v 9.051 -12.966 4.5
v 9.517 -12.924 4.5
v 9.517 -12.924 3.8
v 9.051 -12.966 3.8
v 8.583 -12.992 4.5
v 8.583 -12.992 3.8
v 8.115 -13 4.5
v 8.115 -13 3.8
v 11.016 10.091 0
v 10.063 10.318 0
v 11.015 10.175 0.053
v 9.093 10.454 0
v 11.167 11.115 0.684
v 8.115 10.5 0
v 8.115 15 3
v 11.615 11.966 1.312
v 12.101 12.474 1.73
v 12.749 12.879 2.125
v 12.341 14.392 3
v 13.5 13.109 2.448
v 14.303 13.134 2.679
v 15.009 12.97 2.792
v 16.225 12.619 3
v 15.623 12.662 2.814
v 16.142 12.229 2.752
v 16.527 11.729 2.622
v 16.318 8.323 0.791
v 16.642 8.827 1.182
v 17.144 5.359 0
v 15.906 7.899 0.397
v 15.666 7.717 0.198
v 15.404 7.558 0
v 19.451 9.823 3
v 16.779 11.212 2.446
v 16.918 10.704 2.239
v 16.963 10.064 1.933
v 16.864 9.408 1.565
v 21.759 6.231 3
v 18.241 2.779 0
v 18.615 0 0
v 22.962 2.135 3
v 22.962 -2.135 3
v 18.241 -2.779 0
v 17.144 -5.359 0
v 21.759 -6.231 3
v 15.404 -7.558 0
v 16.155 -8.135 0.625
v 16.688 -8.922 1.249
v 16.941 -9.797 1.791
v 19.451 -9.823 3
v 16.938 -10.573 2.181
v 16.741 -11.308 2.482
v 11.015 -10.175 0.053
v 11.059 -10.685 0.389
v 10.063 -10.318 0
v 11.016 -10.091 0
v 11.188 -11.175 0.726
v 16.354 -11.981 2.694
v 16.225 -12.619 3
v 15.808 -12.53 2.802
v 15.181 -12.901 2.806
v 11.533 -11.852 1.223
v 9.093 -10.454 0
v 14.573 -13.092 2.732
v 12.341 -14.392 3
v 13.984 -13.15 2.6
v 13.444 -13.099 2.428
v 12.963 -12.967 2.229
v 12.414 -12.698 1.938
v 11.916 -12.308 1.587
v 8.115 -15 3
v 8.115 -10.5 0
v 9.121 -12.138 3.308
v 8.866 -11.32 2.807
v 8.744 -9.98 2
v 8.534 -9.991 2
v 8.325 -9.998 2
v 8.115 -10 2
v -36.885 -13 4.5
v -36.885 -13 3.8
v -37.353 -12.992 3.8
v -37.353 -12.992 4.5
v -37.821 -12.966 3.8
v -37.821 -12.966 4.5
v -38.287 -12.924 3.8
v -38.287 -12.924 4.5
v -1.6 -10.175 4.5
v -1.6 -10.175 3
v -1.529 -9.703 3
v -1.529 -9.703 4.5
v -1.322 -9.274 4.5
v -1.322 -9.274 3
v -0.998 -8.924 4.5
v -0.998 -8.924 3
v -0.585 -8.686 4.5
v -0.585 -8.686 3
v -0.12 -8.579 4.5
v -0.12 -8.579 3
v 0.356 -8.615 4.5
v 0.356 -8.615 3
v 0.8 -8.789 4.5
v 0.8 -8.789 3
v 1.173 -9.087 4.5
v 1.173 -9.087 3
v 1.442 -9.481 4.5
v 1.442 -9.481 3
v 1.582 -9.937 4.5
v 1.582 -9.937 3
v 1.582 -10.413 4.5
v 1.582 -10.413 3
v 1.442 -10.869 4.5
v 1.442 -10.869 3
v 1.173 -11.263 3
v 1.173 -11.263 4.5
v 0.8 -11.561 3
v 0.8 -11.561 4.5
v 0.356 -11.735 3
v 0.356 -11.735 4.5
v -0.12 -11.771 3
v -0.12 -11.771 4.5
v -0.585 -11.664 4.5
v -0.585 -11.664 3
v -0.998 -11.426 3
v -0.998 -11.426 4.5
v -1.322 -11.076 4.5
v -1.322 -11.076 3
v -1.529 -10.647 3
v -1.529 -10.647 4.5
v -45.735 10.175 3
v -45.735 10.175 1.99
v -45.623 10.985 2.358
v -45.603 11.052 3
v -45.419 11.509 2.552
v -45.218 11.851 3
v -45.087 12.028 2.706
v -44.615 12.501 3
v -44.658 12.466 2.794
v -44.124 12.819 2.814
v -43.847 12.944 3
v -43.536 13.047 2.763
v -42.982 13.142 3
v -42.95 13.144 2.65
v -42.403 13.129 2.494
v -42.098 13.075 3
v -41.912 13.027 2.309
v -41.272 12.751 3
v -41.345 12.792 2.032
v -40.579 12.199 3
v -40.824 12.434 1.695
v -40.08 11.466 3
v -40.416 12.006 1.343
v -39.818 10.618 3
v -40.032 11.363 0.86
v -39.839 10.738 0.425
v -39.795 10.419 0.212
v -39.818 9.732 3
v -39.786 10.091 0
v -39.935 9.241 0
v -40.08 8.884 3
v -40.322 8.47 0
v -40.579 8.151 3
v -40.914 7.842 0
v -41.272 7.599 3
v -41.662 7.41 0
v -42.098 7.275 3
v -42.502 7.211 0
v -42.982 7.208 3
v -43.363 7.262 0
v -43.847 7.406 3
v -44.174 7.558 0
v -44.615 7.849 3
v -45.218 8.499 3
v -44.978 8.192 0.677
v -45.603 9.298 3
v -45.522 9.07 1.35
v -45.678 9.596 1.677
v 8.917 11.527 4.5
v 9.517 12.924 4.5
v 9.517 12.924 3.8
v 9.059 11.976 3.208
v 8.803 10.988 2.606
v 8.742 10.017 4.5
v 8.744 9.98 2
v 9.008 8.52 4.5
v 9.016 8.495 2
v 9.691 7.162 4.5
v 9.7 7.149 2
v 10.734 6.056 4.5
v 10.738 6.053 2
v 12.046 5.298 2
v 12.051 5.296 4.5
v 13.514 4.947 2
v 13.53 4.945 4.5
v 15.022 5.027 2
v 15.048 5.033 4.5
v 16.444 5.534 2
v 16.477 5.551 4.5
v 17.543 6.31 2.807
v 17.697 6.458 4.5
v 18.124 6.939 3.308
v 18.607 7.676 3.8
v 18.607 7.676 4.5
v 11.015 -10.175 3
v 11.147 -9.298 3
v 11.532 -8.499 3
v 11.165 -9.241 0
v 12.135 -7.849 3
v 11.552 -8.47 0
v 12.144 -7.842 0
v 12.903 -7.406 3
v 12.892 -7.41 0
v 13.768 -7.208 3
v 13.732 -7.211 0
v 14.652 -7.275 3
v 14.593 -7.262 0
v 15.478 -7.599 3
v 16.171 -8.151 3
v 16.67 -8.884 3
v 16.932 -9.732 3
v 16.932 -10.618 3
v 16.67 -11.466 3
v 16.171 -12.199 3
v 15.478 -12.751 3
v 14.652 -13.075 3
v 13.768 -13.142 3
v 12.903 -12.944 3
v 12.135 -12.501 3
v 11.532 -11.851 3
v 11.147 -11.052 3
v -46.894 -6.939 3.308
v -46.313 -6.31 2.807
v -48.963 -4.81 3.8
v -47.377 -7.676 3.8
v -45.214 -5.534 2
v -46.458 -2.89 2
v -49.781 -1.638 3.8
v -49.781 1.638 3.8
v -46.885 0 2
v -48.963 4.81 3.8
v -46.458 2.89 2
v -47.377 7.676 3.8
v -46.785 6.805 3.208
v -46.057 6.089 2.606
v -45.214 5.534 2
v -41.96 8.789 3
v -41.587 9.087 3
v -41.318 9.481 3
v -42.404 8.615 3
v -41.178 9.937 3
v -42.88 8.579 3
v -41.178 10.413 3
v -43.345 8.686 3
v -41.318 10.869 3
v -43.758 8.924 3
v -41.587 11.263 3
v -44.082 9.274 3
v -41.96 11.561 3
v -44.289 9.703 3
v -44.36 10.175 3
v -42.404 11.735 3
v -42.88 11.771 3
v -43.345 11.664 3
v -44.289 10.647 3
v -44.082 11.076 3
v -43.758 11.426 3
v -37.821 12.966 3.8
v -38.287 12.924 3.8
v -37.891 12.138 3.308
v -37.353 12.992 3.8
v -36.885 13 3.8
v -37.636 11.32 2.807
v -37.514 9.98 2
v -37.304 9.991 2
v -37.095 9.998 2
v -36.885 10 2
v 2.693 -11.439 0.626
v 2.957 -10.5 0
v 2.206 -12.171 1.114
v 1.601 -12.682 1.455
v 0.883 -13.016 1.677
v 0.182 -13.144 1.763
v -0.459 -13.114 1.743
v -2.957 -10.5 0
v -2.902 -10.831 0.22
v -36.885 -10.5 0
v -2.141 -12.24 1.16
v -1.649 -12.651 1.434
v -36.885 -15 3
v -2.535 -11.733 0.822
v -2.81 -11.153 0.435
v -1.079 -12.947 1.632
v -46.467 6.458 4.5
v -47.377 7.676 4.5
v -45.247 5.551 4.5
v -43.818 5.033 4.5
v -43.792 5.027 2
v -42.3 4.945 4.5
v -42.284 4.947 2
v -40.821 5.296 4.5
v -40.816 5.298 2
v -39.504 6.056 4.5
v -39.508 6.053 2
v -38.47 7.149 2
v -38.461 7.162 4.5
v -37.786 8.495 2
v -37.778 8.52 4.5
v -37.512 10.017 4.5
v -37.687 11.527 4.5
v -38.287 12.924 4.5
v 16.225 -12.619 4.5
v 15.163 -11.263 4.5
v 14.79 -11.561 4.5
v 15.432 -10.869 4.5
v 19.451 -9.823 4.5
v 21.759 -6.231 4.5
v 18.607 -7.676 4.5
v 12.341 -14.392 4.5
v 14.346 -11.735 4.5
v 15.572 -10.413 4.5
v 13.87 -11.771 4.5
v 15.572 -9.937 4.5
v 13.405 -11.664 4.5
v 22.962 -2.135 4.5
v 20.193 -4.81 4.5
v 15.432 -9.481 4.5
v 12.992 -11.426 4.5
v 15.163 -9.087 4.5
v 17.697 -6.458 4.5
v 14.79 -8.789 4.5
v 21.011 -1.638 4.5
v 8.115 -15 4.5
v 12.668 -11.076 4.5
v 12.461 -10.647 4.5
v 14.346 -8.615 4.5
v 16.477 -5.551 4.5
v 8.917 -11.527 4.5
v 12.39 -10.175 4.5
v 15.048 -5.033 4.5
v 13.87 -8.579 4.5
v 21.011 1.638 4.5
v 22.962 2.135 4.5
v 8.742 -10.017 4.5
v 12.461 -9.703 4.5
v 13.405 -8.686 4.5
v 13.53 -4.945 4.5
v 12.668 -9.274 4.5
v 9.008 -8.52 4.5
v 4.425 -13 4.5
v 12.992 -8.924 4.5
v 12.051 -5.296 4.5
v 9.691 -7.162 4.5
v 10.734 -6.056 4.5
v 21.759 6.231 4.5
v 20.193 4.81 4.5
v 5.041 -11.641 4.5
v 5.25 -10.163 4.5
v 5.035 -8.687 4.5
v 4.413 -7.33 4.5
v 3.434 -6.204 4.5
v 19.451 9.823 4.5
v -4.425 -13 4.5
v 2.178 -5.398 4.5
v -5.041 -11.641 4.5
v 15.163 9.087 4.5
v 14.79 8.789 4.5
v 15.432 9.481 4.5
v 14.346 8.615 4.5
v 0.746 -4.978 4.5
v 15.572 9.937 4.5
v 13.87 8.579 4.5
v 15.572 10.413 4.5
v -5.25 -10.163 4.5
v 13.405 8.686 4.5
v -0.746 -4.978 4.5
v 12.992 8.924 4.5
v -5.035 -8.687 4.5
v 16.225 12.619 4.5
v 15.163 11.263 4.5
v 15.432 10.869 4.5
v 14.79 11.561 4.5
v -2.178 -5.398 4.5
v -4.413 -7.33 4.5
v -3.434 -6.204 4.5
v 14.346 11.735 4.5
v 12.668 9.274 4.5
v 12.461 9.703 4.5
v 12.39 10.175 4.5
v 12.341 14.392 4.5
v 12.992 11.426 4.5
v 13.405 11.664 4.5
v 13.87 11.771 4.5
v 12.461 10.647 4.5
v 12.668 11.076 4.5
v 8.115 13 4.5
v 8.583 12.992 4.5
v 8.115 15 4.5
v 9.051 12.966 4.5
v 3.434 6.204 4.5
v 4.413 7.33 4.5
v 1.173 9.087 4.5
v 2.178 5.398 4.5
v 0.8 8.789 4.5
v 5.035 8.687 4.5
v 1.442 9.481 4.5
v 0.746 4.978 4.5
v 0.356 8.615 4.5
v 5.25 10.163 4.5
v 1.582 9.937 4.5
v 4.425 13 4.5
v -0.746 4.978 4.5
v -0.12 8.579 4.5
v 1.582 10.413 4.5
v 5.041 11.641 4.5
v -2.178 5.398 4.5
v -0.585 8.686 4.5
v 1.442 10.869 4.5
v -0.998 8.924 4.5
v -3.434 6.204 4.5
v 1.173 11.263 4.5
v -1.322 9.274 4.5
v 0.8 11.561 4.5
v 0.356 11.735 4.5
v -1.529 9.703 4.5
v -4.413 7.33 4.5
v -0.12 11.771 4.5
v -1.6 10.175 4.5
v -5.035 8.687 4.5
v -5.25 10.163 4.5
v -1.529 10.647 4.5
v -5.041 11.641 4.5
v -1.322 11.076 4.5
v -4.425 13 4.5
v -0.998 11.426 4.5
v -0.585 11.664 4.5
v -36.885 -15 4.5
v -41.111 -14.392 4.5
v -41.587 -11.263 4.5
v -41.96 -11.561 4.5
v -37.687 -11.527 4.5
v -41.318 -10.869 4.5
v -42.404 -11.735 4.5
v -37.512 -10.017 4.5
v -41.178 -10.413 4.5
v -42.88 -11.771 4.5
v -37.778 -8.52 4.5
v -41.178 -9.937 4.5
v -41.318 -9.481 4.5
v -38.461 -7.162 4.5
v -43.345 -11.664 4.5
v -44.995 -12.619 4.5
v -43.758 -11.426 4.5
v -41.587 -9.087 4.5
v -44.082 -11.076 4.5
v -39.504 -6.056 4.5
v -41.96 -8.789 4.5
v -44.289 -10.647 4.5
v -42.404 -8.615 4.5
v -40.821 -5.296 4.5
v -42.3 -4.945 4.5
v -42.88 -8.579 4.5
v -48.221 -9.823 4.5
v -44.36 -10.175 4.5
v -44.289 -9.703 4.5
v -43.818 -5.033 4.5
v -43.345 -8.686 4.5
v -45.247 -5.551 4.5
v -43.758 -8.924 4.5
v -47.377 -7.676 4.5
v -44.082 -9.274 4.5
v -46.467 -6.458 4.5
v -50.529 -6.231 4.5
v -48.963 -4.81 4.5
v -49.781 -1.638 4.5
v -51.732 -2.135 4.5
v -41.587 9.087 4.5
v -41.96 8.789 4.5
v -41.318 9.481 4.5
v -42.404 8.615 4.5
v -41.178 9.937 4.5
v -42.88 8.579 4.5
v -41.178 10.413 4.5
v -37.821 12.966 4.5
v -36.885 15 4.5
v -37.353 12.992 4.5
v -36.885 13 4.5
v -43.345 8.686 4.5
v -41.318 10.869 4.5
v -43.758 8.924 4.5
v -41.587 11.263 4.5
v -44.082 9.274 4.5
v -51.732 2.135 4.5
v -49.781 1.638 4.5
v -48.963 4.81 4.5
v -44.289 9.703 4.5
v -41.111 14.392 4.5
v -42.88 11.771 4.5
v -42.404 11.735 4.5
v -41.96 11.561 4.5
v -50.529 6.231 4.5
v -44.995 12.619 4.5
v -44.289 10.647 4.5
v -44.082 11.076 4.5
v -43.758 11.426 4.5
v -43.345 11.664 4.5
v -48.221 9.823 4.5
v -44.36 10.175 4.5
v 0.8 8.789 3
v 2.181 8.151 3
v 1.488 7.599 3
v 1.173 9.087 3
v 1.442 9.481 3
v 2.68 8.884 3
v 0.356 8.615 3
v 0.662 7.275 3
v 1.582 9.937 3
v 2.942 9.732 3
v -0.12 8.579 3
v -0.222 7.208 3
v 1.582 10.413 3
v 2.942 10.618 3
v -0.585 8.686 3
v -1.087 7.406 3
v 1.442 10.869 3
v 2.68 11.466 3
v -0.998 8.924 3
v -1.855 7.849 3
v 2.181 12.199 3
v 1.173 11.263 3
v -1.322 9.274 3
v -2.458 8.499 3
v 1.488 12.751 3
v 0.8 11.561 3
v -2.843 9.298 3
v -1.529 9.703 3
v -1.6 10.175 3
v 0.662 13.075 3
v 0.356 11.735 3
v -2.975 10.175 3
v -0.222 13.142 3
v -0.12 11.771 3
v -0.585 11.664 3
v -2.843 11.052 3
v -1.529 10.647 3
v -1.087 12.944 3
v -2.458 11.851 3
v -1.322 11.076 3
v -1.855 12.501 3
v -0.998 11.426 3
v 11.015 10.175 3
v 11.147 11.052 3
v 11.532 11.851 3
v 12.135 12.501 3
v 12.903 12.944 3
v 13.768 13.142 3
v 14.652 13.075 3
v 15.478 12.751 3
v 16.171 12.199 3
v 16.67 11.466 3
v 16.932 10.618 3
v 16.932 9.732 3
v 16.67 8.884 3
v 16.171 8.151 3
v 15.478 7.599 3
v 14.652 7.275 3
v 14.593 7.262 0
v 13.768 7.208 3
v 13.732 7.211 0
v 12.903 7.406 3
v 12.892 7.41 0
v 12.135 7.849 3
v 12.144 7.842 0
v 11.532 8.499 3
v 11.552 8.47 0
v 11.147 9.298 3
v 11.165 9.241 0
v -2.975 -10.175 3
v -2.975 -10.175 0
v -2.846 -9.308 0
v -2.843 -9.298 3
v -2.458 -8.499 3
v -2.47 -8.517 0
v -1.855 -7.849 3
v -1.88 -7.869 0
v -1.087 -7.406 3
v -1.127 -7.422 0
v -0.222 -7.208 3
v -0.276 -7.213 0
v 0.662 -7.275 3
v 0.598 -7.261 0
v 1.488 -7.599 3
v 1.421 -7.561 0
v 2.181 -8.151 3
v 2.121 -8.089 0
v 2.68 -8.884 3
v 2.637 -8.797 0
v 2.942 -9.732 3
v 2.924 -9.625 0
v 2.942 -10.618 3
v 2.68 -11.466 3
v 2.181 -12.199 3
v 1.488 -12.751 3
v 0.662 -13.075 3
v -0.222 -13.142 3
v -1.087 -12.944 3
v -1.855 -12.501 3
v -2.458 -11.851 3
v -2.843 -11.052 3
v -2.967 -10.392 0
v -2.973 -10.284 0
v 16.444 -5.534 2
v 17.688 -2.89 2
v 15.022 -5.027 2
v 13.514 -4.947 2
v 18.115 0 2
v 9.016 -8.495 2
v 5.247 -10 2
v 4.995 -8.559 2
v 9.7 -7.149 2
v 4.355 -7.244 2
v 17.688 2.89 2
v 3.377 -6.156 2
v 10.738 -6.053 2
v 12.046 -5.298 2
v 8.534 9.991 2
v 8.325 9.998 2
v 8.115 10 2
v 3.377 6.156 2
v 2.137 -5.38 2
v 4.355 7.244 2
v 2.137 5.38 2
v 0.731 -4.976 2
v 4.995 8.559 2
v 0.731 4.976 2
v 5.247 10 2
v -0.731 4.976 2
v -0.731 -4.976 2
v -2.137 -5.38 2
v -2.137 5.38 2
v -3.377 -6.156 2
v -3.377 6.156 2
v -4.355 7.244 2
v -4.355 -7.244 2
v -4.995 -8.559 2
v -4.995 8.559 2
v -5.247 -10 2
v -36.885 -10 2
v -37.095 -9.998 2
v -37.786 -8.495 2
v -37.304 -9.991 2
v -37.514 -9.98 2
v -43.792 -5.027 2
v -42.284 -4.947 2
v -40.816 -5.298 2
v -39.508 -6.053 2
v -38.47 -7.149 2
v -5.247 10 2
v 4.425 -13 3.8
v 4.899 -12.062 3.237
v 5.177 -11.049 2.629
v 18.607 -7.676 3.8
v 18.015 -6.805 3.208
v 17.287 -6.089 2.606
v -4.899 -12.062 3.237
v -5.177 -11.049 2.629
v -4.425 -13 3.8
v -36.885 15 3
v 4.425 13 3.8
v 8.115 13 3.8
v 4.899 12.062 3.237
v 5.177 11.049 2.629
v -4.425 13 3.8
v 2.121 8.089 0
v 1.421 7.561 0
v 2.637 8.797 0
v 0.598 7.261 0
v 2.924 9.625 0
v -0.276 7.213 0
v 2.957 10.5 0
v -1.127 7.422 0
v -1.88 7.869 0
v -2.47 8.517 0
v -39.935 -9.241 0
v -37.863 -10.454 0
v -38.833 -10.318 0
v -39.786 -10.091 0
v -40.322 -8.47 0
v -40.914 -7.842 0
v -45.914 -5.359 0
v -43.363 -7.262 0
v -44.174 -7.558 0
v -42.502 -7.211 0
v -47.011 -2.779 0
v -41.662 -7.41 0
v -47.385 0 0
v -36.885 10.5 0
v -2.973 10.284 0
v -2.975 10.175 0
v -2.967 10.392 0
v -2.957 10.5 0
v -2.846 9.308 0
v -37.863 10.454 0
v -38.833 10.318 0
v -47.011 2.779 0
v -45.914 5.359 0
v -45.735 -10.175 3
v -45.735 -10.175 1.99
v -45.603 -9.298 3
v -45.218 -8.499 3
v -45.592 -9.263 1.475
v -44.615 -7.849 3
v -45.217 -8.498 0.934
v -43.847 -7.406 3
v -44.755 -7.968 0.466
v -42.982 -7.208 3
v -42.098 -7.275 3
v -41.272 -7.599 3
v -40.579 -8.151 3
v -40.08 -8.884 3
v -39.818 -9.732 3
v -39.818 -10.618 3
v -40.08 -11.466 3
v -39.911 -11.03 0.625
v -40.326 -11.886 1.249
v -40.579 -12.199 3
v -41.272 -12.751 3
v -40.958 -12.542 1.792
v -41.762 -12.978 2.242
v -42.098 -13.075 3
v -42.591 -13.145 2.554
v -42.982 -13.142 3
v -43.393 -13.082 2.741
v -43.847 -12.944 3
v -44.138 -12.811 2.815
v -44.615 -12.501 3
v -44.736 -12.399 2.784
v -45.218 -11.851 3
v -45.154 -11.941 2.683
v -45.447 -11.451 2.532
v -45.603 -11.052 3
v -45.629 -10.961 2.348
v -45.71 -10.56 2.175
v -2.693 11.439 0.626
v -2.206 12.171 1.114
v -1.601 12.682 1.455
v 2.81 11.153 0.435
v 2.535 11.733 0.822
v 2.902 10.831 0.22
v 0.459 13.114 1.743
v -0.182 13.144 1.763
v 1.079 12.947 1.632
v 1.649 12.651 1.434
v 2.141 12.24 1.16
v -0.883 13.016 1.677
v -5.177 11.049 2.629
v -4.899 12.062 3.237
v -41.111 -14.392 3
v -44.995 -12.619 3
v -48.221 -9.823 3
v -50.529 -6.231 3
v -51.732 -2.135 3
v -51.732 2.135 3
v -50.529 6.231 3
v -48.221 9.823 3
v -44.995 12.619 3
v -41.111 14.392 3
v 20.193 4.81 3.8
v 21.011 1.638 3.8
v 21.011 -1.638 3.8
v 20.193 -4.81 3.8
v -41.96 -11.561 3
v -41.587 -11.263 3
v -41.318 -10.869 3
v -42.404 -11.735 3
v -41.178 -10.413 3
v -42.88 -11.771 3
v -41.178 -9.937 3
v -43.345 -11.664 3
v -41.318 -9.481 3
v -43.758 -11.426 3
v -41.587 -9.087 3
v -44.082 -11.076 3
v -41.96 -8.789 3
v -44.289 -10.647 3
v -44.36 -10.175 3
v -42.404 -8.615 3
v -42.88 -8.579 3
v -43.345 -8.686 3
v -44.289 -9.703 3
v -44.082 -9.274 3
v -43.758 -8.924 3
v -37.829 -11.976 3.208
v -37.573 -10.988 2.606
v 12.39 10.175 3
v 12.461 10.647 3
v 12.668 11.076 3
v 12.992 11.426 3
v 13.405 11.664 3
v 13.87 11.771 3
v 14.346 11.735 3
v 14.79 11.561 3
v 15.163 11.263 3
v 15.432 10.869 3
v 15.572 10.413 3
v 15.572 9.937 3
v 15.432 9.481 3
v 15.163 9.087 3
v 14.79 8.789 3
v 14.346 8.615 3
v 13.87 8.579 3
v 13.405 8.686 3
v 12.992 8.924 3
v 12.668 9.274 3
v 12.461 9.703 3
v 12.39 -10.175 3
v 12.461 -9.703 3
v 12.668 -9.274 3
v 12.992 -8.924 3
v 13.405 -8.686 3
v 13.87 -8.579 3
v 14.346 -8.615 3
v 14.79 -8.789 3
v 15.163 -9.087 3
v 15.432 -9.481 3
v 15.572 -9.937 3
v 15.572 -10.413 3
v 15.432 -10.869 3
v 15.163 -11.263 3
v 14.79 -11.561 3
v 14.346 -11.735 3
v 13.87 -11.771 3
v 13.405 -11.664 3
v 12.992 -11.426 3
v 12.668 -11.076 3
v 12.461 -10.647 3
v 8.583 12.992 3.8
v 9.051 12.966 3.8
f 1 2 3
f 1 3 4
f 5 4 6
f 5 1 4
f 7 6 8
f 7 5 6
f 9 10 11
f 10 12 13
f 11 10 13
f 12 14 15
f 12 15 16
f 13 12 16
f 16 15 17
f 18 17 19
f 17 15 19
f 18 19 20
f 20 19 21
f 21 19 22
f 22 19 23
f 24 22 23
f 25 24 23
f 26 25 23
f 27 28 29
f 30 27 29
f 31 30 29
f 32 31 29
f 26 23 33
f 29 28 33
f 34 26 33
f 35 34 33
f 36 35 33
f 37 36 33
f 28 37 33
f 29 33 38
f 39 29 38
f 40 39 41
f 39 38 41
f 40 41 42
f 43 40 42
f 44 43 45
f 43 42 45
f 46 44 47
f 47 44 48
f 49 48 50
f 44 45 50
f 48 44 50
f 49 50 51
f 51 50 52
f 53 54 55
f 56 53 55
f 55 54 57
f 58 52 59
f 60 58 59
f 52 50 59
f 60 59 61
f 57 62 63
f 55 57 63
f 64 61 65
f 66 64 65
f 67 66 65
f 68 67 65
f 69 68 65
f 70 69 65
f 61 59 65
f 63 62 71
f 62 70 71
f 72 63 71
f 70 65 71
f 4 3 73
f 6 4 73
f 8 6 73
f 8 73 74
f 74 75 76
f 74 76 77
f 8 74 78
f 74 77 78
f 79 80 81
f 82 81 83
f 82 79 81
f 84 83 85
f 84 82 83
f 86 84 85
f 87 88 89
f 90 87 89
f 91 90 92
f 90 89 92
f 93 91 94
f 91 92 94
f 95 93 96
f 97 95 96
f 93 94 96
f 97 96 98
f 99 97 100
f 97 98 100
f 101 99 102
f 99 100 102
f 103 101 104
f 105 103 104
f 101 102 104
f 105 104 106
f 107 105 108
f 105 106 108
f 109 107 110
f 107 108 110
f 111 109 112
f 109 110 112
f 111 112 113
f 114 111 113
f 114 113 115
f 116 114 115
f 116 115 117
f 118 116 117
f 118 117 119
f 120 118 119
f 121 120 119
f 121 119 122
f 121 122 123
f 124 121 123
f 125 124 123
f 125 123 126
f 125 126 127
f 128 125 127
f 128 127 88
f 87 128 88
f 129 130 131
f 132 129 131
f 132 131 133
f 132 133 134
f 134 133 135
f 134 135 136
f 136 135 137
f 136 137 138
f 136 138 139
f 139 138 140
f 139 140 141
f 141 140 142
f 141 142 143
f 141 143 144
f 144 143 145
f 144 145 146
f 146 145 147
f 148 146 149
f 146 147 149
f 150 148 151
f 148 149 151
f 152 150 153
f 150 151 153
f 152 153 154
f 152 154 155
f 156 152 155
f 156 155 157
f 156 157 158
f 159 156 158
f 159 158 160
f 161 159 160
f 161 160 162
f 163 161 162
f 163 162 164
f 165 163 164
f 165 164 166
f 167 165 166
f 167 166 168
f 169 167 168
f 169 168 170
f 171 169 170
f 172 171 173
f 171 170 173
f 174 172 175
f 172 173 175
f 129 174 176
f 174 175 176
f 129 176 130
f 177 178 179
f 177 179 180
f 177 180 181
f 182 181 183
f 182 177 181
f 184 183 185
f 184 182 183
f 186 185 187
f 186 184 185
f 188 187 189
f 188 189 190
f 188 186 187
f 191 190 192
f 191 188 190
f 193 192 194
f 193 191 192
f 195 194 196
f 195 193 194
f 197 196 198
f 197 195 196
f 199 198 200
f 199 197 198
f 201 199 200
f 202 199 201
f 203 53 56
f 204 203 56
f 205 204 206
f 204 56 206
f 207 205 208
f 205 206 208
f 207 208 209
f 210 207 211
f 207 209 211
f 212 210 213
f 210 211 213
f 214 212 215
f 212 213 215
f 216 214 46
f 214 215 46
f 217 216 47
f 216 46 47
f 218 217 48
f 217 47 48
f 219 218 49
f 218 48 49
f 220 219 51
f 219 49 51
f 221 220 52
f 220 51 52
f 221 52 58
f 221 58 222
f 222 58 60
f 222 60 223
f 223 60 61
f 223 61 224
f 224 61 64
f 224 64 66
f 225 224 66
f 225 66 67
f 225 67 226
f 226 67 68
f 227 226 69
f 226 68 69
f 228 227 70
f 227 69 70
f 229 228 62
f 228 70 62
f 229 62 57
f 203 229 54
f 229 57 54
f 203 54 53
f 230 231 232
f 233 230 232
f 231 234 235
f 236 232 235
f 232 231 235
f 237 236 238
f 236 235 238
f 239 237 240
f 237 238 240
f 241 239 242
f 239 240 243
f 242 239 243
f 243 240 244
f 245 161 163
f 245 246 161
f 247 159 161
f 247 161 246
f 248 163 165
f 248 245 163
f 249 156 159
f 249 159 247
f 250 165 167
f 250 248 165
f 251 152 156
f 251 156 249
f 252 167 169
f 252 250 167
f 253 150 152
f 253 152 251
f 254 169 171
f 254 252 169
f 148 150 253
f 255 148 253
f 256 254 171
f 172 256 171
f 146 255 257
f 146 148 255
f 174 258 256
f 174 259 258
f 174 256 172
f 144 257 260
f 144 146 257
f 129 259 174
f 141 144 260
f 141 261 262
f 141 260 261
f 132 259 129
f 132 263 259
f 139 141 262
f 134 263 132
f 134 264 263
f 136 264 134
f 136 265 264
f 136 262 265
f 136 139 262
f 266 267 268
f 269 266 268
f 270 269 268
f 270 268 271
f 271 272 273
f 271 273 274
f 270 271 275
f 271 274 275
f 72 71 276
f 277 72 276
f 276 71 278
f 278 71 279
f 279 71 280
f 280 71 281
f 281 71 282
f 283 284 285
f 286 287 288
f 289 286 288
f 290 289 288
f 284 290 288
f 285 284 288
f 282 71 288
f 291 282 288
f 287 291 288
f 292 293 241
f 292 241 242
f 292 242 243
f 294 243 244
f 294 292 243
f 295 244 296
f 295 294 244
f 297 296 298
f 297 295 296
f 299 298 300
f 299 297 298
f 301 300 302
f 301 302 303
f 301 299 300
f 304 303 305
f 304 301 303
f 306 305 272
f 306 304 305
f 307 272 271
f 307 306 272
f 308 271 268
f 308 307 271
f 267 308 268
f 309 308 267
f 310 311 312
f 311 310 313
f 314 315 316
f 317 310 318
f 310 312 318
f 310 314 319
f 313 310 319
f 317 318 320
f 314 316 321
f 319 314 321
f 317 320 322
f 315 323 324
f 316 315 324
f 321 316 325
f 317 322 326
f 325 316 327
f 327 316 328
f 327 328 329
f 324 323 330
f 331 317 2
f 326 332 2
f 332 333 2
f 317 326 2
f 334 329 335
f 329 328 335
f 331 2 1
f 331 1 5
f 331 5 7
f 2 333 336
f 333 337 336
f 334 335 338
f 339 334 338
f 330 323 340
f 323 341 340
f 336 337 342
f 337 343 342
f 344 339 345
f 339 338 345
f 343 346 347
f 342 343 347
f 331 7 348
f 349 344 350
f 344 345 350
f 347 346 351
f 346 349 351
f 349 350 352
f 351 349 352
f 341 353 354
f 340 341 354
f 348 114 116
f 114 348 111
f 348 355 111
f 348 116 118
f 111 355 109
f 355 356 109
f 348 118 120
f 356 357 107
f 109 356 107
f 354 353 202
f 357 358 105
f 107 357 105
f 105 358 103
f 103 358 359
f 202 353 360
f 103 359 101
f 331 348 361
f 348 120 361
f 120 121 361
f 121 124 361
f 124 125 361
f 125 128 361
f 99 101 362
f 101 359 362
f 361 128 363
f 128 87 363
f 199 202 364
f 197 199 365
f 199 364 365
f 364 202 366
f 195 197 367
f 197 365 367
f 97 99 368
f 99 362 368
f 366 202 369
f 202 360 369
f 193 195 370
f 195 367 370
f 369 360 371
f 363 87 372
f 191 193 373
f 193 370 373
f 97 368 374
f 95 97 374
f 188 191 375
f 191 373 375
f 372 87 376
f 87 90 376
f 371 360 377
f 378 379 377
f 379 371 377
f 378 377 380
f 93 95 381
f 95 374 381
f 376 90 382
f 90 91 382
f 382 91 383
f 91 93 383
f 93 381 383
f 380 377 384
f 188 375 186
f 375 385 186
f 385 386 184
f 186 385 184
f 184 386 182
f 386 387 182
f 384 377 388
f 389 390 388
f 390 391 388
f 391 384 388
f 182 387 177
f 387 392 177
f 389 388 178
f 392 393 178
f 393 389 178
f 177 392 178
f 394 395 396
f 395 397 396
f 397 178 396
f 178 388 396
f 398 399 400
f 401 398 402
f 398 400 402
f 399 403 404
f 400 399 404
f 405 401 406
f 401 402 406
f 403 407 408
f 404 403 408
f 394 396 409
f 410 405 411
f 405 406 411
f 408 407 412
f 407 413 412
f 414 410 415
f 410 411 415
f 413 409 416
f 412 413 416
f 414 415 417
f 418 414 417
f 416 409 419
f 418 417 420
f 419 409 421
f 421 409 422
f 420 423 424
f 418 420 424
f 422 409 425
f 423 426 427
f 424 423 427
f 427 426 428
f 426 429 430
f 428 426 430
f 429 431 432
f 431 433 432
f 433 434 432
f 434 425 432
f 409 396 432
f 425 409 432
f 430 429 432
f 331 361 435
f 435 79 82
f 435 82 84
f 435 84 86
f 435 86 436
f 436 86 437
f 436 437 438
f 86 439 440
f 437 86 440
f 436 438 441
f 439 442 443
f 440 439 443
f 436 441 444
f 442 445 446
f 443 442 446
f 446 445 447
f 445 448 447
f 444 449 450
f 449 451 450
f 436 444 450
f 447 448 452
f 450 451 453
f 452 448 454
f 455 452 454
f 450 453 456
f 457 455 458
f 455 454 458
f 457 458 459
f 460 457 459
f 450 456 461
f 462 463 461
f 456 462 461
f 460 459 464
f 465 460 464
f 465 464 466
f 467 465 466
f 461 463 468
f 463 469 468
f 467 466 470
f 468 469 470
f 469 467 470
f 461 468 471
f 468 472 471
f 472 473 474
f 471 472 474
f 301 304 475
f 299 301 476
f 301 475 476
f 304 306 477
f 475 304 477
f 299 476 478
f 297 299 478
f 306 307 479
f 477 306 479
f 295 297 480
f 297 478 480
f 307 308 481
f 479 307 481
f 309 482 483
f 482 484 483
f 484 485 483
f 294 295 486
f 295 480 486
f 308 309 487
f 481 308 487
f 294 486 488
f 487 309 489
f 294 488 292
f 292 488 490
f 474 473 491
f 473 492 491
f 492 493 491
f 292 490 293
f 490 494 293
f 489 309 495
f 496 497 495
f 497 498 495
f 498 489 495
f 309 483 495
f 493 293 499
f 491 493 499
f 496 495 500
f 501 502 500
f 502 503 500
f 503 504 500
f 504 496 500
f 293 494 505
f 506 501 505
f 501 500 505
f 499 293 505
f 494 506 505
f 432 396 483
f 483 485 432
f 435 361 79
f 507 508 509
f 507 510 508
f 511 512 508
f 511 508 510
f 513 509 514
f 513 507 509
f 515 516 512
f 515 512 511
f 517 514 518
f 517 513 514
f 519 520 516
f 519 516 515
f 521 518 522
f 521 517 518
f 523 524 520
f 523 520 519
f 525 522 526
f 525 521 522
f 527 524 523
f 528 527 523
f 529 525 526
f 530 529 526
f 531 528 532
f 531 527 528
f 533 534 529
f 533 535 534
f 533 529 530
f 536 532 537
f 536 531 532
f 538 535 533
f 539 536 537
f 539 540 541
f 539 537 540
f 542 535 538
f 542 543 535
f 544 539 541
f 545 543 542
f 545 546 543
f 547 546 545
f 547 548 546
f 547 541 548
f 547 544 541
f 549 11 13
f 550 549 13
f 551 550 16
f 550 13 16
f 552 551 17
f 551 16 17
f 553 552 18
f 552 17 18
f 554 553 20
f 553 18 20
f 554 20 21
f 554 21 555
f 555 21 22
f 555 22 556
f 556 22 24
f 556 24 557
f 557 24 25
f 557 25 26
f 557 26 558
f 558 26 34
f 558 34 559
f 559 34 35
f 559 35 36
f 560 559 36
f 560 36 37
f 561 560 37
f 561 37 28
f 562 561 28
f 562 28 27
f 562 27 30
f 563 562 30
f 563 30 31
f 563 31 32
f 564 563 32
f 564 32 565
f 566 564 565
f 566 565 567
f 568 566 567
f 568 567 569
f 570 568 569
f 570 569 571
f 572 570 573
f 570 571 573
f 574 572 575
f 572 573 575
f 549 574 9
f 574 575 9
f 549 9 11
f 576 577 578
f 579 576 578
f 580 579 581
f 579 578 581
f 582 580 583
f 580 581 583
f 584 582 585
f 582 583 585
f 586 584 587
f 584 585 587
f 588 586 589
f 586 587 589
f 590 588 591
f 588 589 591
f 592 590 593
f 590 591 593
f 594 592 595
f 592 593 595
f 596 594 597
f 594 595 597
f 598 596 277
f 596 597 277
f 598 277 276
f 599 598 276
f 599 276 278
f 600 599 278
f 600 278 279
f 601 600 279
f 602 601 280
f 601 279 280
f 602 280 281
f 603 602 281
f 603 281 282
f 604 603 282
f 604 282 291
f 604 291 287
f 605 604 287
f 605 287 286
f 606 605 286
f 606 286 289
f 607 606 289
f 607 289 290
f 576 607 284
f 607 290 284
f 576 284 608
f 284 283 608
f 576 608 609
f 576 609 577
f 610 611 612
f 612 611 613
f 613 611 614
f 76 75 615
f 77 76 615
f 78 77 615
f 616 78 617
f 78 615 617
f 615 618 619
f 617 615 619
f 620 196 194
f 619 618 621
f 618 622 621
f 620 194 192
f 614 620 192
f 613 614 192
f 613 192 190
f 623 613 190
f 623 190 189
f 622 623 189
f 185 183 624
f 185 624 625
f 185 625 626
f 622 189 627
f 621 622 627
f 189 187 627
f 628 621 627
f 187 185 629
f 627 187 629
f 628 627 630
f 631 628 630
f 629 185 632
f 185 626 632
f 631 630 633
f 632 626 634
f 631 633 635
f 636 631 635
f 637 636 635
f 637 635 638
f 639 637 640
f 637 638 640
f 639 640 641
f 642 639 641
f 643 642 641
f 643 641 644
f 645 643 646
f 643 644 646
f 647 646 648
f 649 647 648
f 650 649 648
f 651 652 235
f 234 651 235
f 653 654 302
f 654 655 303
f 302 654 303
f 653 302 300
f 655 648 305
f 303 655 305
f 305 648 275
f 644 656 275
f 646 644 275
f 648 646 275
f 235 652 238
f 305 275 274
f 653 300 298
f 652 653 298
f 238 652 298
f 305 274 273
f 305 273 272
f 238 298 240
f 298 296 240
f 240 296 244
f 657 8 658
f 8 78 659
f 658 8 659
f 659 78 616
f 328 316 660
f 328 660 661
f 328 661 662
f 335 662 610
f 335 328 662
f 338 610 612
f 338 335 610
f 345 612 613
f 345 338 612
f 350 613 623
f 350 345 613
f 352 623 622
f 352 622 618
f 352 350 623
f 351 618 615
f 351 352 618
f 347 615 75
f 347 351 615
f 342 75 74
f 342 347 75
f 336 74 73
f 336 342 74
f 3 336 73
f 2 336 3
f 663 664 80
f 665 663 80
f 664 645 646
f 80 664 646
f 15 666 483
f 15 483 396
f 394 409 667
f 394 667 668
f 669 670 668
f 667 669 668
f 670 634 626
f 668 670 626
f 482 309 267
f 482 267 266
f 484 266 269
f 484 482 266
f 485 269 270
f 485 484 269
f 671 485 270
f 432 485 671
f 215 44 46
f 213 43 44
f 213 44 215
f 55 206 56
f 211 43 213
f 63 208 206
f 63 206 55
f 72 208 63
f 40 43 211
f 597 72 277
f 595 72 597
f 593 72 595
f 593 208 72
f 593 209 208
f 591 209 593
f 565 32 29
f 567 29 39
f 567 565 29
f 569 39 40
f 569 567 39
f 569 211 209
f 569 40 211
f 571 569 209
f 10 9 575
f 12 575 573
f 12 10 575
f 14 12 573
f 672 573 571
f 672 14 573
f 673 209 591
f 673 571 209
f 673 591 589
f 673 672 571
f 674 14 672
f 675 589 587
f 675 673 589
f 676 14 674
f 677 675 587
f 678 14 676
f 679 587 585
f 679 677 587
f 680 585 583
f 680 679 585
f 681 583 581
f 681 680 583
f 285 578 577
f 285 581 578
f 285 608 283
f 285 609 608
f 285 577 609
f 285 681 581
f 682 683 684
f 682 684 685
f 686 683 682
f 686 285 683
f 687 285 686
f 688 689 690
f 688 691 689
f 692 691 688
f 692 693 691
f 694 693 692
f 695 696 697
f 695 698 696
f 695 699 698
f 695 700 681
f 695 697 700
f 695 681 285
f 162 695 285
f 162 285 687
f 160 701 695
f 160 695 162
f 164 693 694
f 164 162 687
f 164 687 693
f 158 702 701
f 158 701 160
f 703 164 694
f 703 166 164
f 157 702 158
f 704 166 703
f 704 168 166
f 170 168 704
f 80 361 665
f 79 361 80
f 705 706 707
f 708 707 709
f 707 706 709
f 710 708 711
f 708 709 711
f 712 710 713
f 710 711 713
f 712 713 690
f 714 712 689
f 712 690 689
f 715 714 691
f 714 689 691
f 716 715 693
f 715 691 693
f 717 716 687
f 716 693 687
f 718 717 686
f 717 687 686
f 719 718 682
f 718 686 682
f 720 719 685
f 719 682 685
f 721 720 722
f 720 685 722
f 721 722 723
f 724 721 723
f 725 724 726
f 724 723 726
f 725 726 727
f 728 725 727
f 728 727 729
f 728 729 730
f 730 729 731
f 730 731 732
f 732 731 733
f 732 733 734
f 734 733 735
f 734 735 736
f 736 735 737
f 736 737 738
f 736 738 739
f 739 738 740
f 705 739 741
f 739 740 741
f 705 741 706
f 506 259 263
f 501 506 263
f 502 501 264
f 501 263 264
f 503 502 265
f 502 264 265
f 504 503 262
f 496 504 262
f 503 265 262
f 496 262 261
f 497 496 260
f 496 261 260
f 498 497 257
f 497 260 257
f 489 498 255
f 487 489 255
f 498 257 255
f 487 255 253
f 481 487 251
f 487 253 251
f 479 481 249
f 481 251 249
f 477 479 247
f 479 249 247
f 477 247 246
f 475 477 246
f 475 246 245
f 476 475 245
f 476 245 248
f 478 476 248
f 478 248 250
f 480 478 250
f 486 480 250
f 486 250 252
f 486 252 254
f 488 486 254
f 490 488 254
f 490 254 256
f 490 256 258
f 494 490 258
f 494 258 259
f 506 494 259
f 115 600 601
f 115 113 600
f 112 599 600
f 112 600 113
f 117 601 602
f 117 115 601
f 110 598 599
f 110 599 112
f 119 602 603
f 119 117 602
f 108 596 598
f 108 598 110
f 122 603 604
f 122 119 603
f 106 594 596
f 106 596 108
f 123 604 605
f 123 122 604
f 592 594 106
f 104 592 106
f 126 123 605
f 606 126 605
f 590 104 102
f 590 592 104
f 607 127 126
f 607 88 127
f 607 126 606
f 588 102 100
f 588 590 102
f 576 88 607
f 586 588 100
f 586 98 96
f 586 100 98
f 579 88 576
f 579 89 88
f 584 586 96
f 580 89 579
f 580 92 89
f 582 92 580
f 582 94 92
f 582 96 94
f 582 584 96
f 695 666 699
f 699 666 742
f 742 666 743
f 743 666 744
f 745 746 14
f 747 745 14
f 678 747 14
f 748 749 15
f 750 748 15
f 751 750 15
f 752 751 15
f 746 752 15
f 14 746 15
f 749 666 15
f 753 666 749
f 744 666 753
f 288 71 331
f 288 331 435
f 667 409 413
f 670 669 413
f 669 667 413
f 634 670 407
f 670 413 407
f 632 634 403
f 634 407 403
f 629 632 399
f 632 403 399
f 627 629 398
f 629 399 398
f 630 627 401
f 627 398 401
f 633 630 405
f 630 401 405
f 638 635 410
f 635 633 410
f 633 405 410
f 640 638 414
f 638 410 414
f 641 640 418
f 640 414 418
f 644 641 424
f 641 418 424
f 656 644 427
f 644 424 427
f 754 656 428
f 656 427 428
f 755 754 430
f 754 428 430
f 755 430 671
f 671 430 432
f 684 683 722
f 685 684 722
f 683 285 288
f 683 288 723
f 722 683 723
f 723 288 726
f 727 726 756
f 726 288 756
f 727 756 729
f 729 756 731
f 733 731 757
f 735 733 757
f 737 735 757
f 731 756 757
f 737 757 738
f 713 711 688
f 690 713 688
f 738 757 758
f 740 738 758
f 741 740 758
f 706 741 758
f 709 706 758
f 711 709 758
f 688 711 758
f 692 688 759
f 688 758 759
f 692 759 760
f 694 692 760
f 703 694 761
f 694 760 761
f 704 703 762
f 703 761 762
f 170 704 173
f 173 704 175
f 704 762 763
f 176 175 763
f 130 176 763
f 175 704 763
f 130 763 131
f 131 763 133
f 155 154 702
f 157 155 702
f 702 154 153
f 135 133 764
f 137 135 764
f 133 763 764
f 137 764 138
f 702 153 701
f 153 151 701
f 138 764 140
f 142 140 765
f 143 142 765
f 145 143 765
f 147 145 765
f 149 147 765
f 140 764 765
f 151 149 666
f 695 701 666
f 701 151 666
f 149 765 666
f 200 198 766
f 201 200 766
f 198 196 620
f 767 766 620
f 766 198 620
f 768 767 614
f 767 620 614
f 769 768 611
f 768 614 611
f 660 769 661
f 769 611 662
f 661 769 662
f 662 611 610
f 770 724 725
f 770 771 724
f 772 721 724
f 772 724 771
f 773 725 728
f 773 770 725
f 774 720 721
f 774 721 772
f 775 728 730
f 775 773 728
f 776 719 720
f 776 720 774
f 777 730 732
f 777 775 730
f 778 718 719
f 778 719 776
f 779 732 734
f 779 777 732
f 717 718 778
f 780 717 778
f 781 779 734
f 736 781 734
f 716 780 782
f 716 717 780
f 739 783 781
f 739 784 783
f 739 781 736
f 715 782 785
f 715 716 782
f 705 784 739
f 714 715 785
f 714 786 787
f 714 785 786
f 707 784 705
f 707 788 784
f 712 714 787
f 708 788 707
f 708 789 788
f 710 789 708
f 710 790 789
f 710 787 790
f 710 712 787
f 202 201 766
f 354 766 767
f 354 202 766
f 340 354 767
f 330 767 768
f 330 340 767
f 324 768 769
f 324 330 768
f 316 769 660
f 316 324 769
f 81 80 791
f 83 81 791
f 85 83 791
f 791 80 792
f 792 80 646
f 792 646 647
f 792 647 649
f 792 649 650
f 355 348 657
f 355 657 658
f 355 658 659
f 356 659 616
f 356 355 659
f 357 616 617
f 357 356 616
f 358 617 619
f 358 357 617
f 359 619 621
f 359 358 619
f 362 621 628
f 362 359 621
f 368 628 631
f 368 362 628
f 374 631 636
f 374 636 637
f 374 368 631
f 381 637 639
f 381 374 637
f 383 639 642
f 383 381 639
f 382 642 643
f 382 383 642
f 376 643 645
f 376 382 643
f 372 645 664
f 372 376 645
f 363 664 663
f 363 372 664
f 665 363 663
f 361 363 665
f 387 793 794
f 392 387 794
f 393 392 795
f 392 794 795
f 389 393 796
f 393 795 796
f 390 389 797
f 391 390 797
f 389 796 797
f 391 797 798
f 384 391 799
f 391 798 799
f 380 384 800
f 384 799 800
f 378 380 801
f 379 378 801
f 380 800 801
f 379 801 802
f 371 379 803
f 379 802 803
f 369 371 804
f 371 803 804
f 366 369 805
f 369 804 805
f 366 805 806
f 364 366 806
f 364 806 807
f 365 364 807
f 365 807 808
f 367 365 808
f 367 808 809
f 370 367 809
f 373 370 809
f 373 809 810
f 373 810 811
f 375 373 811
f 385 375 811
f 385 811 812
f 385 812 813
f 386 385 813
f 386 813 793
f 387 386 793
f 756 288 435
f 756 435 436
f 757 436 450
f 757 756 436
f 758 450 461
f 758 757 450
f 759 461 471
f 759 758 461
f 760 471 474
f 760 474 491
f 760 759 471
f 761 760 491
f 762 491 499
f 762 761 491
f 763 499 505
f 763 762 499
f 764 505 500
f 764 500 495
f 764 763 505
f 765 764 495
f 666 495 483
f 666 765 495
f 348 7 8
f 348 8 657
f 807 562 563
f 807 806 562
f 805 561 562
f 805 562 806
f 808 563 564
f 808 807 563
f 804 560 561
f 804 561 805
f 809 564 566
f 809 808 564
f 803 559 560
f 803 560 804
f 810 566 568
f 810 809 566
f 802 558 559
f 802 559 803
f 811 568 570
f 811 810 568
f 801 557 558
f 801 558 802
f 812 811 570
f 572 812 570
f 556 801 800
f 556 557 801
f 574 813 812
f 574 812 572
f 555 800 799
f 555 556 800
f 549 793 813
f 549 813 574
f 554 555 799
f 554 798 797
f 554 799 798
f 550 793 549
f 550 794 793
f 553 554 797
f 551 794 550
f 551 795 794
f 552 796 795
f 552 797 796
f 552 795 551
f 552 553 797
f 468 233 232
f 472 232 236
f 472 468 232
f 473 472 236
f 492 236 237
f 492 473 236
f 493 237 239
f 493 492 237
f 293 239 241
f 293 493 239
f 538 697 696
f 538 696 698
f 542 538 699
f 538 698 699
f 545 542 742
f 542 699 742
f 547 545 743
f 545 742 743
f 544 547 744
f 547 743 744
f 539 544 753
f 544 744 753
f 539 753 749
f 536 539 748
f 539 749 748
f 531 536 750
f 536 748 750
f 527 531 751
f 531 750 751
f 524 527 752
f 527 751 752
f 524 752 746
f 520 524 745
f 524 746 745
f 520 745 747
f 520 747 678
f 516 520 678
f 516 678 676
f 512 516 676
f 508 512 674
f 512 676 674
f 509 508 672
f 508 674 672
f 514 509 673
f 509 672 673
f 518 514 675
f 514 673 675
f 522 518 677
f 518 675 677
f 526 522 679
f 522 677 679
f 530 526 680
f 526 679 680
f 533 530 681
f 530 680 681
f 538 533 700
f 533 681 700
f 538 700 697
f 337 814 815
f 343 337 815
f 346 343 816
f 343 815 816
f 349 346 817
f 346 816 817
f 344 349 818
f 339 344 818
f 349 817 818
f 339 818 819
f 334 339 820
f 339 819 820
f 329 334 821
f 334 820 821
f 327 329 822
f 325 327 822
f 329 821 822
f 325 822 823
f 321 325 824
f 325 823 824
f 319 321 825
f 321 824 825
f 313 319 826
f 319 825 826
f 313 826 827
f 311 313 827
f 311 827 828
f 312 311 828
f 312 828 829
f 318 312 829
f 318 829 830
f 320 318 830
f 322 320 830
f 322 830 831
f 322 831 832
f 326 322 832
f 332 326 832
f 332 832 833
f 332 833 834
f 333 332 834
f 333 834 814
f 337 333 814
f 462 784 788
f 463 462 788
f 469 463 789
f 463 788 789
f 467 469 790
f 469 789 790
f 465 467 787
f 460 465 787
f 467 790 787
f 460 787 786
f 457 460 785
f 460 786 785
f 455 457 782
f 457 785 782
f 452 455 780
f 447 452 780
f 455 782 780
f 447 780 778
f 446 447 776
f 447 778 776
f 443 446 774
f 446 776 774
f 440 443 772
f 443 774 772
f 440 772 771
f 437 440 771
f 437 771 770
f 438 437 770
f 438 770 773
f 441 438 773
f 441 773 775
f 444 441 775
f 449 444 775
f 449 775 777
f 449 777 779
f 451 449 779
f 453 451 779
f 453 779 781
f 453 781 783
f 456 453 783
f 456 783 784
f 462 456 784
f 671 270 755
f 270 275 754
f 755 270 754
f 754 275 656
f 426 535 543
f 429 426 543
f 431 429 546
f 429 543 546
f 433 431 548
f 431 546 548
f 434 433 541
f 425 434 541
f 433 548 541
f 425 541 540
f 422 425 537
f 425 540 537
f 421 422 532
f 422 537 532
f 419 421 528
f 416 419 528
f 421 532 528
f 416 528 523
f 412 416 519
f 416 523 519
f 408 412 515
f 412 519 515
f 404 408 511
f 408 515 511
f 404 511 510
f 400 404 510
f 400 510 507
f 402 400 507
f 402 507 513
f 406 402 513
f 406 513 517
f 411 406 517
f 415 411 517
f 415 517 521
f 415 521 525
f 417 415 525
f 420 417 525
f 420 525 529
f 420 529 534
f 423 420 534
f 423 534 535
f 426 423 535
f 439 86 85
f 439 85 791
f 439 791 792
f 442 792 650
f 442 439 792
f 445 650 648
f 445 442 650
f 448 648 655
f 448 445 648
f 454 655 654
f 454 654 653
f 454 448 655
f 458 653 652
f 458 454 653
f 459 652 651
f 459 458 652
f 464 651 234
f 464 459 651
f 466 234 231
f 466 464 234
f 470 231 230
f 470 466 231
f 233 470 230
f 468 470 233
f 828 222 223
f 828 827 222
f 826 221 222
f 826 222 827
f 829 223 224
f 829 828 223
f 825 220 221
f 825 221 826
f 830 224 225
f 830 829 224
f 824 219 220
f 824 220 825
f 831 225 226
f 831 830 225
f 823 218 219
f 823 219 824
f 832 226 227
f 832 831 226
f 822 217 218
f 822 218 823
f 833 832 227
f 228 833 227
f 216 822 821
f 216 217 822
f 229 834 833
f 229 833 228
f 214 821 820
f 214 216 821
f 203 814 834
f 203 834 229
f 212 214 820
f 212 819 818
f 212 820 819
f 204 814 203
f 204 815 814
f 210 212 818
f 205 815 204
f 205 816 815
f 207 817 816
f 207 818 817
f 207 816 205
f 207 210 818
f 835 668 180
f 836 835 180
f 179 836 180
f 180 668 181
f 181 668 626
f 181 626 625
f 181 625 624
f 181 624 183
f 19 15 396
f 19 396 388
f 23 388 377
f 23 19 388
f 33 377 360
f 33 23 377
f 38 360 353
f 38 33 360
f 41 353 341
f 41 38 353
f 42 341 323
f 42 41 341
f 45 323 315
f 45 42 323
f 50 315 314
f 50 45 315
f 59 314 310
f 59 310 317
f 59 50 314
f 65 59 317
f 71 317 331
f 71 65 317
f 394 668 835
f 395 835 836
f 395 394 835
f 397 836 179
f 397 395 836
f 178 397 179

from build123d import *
from OCP.BRepFilletAPI import BRepFilletAPI_MakeChamfer

# Parameters (mm, degrees)
BOSS_EXTRUDE1_DEPTH = 4.5
CUT_EXTRUDE1_DEPTH  = 2.5
CHAMFER1_SIZE       = 1.8
CHAMFER1_SIZE2      = 3
CHAMFER2_SIZE       = 4.5
CHAMFER2_SIZE2      = 3
BOSS_EXTRUDE2_REACH = 56.197
SKETCH3_R           = 2.975
CUT_EXTRUDE2_DEPTH  = 3
CUT_EXTRUDE3_REACH  = 56.093
SKETCH5_R           = 1.6


with BuildPart() as part:
    # Sketch1 → Boss-Extrude1 (new body)
    with BuildSketch(Plane.XY):
        with BuildLine():
            Line((-36.885, 15), (8.115, 15))
            ThreePointArc((8.115, 15), (23.115, 0), (8.115, -15))
            Line((8.115, -15), (-36.885, -15))
            ThreePointArc((-36.885, -15), (-51.885, 0), (-36.885, 15))
        make_face()
    extrude(amount=BOSS_EXTRUDE1_DEPTH)

    # Sketch2 → Cut-Extrude1 (cut)
    with BuildSketch(Plane.XY.offset(4.5)):
        with BuildLine():
            Line((-36.885, 13), (8.115, 13))
            ThreePointArc((8.115, 13), (21.115, 0), (8.115, -13))
            Line((8.115, -13), (-36.885, -13))
            ThreePointArc((-36.885, -13), (-49.885, 0), (-36.885, 13))
        make_face()
    extrude(amount=-CUT_EXTRUDE1_DEPTH, mode=Mode.SUBTRACT)

    # Chamfer1: one chamfer whose edges measure the first distance from different faces: ONE call of the kernel's chamfer builder (chamfer() names one face for all edges)
    chamfer1_edges_1 = [part.edges().sort_by_distance(p)[0] for p in [
        (-49.885, 0, 2),
    ]]
    chamfer1_side_1 = [part.faces().sort_by_distance(p)[0] for p in [
        (-49.885, 0, 3.25),
    ]]
    chamfer1_edges_2 = [part.edges().sort_by_distance(p)[0] for p in [
        (-14.385, 13, 2),
    ]]
    chamfer1_side_2 = [part.faces().sort_by_distance(p)[0] for p in [
        (-14.385, 13, 3.25),
    ]]
    chamfer1_edges_3 = [part.edges().sort_by_distance(p)[0] for p in [
        (21.115, 0, 2),
    ]]
    chamfer1_side_3 = [part.faces().sort_by_distance(p)[0] for p in [
        (21.115, 0, 3.25),
    ]]
    chamfer1_edges_4 = [part.edges().sort_by_distance(p)[0] for p in [
        (-14.385, -13, 2),
    ]]
    chamfer1_side_4 = [part.faces().sort_by_distance(p)[0] for p in [
        (-14.385, -13, 3.25),
    ]]
    chamfer1 = BRepFilletAPI_MakeChamfer(part.part.solid().wrapped)
    for e in chamfer1_edges_1:
        chamfer1.Add(CHAMFER1_SIZE, CHAMFER1_SIZE2, e.wrapped, chamfer1_side_1[0].wrapped)  # the first distance lies on this face
    for e in chamfer1_edges_2:
        chamfer1.Add(CHAMFER1_SIZE, CHAMFER1_SIZE2, e.wrapped, chamfer1_side_2[0].wrapped)  # the first distance lies on this face
    for e in chamfer1_edges_3:
        chamfer1.Add(CHAMFER1_SIZE, CHAMFER1_SIZE2, e.wrapped, chamfer1_side_3[0].wrapped)  # the first distance lies on this face
    for e in chamfer1_edges_4:
        chamfer1.Add(CHAMFER1_SIZE, CHAMFER1_SIZE2, e.wrapped, chamfer1_side_4[0].wrapped)  # the first distance lies on this face
    add(Compound.cast(chamfer1.Shape()), mode=Mode.REPLACE)

    # Chamfer2
    chamfer2_edges = [part.edges().sort_by_distance(p)[0] for p in [
        (-14.385, 15, 0),
        (23.115, 0, 0),
        (-14.385, -15, 0),
        (-51.885, 0, 0),
    ]]
    chamfer2_side = [part.faces().sort_by_distance(p)[0] for p in [
        (-14.385, 0, 0),
    ]]
    chamfer(chamfer2_edges, length=CHAMFER2_SIZE, length2=CHAMFER2_SIZE2, reference=chamfer2_side[0])

    # Sketch4 → Boss-Extrude2 (add, up to next)
    with BuildSketch(Plane.XY.offset(4.5), mode=Mode.PRIVATE) as boss_extrude2_sk1:
        with BuildLine():
            Line((-4.425141241, 13), (4.425141241, 13))
            ThreePointArc((4.425141241, 13), (0, 4.925), (-4.425141241, 13))
        make_face()
    boss_extrude2_tool1 = extrude(boss_extrude2_sk1.sketch, amount=-BOSS_EXTRUDE2_REACH, mode=Mode.PRIVATE) - part.part
    # Sketch4 → Boss-Extrude2 (add, up to next)
    with BuildSketch(Plane.XY.offset(4.5), mode=Mode.PRIVATE) as boss_extrude2_sk2:
        with BuildLine():
            Line((-4.425141241, -13), (4.425141241, -13))
            ThreePointArc((4.425141241, -13), (0, -4.925), (-4.425141241, -13))
        make_face()
    boss_extrude2_tool2 = extrude(boss_extrude2_sk2.sketch, amount=-BOSS_EXTRUDE2_REACH, mode=Mode.PRIVATE) - part.part
    # Sketch4 → Boss-Extrude2 (add, up to next)
    with BuildSketch(Plane.XY.offset(4.5), mode=Mode.PRIVATE) as boss_extrude2_sk3:
        with BuildLine():
            ThreePointArc((-47.376988812, 7.675817271), (-40.134845505, 5.628455832), (-38.287336686, 12.924142208))
            ThreePointArc((-38.287336686, 12.924142208), (-43.38538256, 11.25810937), (-47.376988812, 7.675817271))
        make_face()
    boss_extrude2_tool3 = extrude(boss_extrude2_sk3.sketch, amount=-BOSS_EXTRUDE2_REACH, mode=Mode.PRIVATE) - part.part
    # Sketch4 → Boss-Extrude2 (add, up to next)
    with BuildSketch(Plane.XY.offset(4.5), mode=Mode.PRIVATE) as boss_extrude2_sk4:
        with BuildLine():
            ThreePointArc((9.517336686, 12.924142208), (11.364845505, 5.628455832), (18.606988812, 7.675817271))
            ThreePointArc((18.606988812, 7.675817271), (14.61538256, 11.25810937), (9.517336686, 12.924142208))
        make_face()
    boss_extrude2_tool4 = extrude(boss_extrude2_sk4.sketch, amount=-BOSS_EXTRUDE2_REACH, mode=Mode.PRIVATE) - part.part
    # Sketch4 → Boss-Extrude2 (add, up to next)
    with BuildSketch(Plane.XY.offset(4.5), mode=Mode.PRIVATE) as boss_extrude2_sk5:
        with BuildLine():
            ThreePointArc((18.606988812, -7.675817271), (11.364845505, -5.628455832), (9.517336686, -12.924142208))
            ThreePointArc((9.517336686, -12.924142208), (14.61538256, -11.25810937), (18.606988812, -7.675817271))
        make_face()
    boss_extrude2_tool5 = extrude(boss_extrude2_sk5.sketch, amount=-BOSS_EXTRUDE2_REACH, mode=Mode.PRIVATE) - part.part
    # Sketch4 → Boss-Extrude2 (add, up to next)
    with BuildSketch(Plane.XY.offset(4.5), mode=Mode.PRIVATE) as boss_extrude2_sk6:
        with BuildLine():
            ThreePointArc((-38.287336686, -12.924142208), (-40.134845505, -5.628455832), (-47.376988812, -7.675817271))
            ThreePointArc((-47.376988812, -7.675817271), (-43.38538256, -11.25810937), (-38.287336686, -12.924142208))
        make_face()
    boss_extrude2_tool6 = extrude(boss_extrude2_sk6.sketch, amount=-BOSS_EXTRUDE2_REACH, mode=Mode.PRIVATE) - part.part
    add(boss_extrude2_tool1.solids().sort_by_distance((0, 9.366558, 4.5))[0])
    add(boss_extrude2_tool2.solids().sort_by_distance((0, -9.366558, 4.5))[0])
    add(boss_extrude2_tool3.solids().sort_by_distance((-41.888013, 8.664793, 4.5))[0])
    add(boss_extrude2_tool4.solids().sort_by_distance((13.118013, 8.664793, 4.5))[0])
    add(boss_extrude2_tool5.solids().sort_by_distance((13.118013, -8.664793, 4.5))[0])
    add(boss_extrude2_tool6.solids().sort_by_distance((-41.888013, -8.664793, 4.5))[0])

    # Sketch3 → Cut-Extrude2 (cut)
    with BuildSketch(Plane(origin=(0, 0, 0), x_dir=(-1, 0, 0), z_dir=(0, 0, -1))):
        with Locations((-13.99, 10.175)):
            Circle(SKETCH3_R)
        with Locations((0, 10.175)):
            Circle(SKETCH3_R)
        with Locations((42.76, 10.175)):
            Circle(SKETCH3_R)
        with Locations((42.76, -10.175)):
            Circle(SKETCH3_R)
        with Locations((0, -10.175)):
            Circle(SKETCH3_R)
        with Locations((-13.99, -10.175)):
            Circle(SKETCH3_R)
    extrude(amount=-CUT_EXTRUDE2_DEPTH, mode=Mode.SUBTRACT)

    # Sketch5 → Cut-Extrude3 (cut, up to next)
    with BuildSketch(Plane(origin=(0, 0, 3), x_dir=(-1, 0, 0), z_dir=(0, 0, -1)), mode=Mode.PRIVATE) as cut_extrude3_sk1:
        with Locations((-13.99, 10.175)):
            Circle(SKETCH5_R)
    cut_extrude3_tool1 = extrude(cut_extrude3_sk1.sketch, amount=-CUT_EXTRUDE3_REACH, mode=Mode.PRIVATE) & part.part
    # Sketch5 → Cut-Extrude3 (cut, up to next)
    with BuildSketch(Plane(origin=(0, 0, 3), x_dir=(-1, 0, 0), z_dir=(0, 0, -1)), mode=Mode.PRIVATE) as cut_extrude3_sk2:
        with Locations((0, 10.175)):
            Circle(SKETCH5_R)
    cut_extrude3_tool2 = extrude(cut_extrude3_sk2.sketch, amount=-CUT_EXTRUDE3_REACH, mode=Mode.PRIVATE) & part.part
    # Sketch5 → Cut-Extrude3 (cut, up to next)
    with BuildSketch(Plane(origin=(0, 0, 3), x_dir=(-1, 0, 0), z_dir=(0, 0, -1)), mode=Mode.PRIVATE) as cut_extrude3_sk3:
        with Locations((42.76, 10.175)):
            Circle(SKETCH5_R)
    cut_extrude3_tool3 = extrude(cut_extrude3_sk3.sketch, amount=-CUT_EXTRUDE3_REACH, mode=Mode.PRIVATE) & part.part
    # Sketch5 → Cut-Extrude3 (cut, up to next)
    with BuildSketch(Plane(origin=(0, 0, 3), x_dir=(-1, 0, 0), z_dir=(0, 0, -1)), mode=Mode.PRIVATE) as cut_extrude3_sk4:
        with Locations((42.76, -10.175)):
            Circle(SKETCH5_R)
    cut_extrude3_tool4 = extrude(cut_extrude3_sk4.sketch, amount=-CUT_EXTRUDE3_REACH, mode=Mode.PRIVATE) & part.part
    # Sketch5 → Cut-Extrude3 (cut, up to next)
    with BuildSketch(Plane(origin=(0, 0, 3), x_dir=(-1, 0, 0), z_dir=(0, 0, -1)), mode=Mode.PRIVATE) as cut_extrude3_sk5:
        with Locations((0, -10.175)):
            Circle(SKETCH5_R)
    cut_extrude3_tool5 = extrude(cut_extrude3_sk5.sketch, amount=-CUT_EXTRUDE3_REACH, mode=Mode.PRIVATE) & part.part
    # Sketch5 → Cut-Extrude3 (cut, up to next)
    with BuildSketch(Plane(origin=(0, 0, 3), x_dir=(-1, 0, 0), z_dir=(0, 0, -1)), mode=Mode.PRIVATE) as cut_extrude3_sk6:
        with Locations((-13.99, -10.175)):
            Circle(SKETCH5_R)
    cut_extrude3_tool6 = extrude(cut_extrude3_sk6.sketch, amount=-CUT_EXTRUDE3_REACH, mode=Mode.PRIVATE) & part.part
    add(cut_extrude3_tool1.solids().sort_by_distance((13.99, 10.175, 3))[0], mode=Mode.SUBTRACT)
    add(cut_extrude3_tool2.solids().sort_by_distance((0, 10.175, 3))[0], mode=Mode.SUBTRACT)
    add(cut_extrude3_tool3.solids().sort_by_distance((-42.76, 10.175, 3))[0], mode=Mode.SUBTRACT)
    add(cut_extrude3_tool4.solids().sort_by_distance((-42.76, -10.175, 3))[0], mode=Mode.SUBTRACT)
    add(cut_extrude3_tool5.solids().sort_by_distance((0, -10.175, 3))[0], mode=Mode.SUBTRACT)
    add(cut_extrude3_tool6.solids().sort_by_distance((13.99, -10.175, 3))[0], mode=Mode.SUBTRACT)


solid = part.part
